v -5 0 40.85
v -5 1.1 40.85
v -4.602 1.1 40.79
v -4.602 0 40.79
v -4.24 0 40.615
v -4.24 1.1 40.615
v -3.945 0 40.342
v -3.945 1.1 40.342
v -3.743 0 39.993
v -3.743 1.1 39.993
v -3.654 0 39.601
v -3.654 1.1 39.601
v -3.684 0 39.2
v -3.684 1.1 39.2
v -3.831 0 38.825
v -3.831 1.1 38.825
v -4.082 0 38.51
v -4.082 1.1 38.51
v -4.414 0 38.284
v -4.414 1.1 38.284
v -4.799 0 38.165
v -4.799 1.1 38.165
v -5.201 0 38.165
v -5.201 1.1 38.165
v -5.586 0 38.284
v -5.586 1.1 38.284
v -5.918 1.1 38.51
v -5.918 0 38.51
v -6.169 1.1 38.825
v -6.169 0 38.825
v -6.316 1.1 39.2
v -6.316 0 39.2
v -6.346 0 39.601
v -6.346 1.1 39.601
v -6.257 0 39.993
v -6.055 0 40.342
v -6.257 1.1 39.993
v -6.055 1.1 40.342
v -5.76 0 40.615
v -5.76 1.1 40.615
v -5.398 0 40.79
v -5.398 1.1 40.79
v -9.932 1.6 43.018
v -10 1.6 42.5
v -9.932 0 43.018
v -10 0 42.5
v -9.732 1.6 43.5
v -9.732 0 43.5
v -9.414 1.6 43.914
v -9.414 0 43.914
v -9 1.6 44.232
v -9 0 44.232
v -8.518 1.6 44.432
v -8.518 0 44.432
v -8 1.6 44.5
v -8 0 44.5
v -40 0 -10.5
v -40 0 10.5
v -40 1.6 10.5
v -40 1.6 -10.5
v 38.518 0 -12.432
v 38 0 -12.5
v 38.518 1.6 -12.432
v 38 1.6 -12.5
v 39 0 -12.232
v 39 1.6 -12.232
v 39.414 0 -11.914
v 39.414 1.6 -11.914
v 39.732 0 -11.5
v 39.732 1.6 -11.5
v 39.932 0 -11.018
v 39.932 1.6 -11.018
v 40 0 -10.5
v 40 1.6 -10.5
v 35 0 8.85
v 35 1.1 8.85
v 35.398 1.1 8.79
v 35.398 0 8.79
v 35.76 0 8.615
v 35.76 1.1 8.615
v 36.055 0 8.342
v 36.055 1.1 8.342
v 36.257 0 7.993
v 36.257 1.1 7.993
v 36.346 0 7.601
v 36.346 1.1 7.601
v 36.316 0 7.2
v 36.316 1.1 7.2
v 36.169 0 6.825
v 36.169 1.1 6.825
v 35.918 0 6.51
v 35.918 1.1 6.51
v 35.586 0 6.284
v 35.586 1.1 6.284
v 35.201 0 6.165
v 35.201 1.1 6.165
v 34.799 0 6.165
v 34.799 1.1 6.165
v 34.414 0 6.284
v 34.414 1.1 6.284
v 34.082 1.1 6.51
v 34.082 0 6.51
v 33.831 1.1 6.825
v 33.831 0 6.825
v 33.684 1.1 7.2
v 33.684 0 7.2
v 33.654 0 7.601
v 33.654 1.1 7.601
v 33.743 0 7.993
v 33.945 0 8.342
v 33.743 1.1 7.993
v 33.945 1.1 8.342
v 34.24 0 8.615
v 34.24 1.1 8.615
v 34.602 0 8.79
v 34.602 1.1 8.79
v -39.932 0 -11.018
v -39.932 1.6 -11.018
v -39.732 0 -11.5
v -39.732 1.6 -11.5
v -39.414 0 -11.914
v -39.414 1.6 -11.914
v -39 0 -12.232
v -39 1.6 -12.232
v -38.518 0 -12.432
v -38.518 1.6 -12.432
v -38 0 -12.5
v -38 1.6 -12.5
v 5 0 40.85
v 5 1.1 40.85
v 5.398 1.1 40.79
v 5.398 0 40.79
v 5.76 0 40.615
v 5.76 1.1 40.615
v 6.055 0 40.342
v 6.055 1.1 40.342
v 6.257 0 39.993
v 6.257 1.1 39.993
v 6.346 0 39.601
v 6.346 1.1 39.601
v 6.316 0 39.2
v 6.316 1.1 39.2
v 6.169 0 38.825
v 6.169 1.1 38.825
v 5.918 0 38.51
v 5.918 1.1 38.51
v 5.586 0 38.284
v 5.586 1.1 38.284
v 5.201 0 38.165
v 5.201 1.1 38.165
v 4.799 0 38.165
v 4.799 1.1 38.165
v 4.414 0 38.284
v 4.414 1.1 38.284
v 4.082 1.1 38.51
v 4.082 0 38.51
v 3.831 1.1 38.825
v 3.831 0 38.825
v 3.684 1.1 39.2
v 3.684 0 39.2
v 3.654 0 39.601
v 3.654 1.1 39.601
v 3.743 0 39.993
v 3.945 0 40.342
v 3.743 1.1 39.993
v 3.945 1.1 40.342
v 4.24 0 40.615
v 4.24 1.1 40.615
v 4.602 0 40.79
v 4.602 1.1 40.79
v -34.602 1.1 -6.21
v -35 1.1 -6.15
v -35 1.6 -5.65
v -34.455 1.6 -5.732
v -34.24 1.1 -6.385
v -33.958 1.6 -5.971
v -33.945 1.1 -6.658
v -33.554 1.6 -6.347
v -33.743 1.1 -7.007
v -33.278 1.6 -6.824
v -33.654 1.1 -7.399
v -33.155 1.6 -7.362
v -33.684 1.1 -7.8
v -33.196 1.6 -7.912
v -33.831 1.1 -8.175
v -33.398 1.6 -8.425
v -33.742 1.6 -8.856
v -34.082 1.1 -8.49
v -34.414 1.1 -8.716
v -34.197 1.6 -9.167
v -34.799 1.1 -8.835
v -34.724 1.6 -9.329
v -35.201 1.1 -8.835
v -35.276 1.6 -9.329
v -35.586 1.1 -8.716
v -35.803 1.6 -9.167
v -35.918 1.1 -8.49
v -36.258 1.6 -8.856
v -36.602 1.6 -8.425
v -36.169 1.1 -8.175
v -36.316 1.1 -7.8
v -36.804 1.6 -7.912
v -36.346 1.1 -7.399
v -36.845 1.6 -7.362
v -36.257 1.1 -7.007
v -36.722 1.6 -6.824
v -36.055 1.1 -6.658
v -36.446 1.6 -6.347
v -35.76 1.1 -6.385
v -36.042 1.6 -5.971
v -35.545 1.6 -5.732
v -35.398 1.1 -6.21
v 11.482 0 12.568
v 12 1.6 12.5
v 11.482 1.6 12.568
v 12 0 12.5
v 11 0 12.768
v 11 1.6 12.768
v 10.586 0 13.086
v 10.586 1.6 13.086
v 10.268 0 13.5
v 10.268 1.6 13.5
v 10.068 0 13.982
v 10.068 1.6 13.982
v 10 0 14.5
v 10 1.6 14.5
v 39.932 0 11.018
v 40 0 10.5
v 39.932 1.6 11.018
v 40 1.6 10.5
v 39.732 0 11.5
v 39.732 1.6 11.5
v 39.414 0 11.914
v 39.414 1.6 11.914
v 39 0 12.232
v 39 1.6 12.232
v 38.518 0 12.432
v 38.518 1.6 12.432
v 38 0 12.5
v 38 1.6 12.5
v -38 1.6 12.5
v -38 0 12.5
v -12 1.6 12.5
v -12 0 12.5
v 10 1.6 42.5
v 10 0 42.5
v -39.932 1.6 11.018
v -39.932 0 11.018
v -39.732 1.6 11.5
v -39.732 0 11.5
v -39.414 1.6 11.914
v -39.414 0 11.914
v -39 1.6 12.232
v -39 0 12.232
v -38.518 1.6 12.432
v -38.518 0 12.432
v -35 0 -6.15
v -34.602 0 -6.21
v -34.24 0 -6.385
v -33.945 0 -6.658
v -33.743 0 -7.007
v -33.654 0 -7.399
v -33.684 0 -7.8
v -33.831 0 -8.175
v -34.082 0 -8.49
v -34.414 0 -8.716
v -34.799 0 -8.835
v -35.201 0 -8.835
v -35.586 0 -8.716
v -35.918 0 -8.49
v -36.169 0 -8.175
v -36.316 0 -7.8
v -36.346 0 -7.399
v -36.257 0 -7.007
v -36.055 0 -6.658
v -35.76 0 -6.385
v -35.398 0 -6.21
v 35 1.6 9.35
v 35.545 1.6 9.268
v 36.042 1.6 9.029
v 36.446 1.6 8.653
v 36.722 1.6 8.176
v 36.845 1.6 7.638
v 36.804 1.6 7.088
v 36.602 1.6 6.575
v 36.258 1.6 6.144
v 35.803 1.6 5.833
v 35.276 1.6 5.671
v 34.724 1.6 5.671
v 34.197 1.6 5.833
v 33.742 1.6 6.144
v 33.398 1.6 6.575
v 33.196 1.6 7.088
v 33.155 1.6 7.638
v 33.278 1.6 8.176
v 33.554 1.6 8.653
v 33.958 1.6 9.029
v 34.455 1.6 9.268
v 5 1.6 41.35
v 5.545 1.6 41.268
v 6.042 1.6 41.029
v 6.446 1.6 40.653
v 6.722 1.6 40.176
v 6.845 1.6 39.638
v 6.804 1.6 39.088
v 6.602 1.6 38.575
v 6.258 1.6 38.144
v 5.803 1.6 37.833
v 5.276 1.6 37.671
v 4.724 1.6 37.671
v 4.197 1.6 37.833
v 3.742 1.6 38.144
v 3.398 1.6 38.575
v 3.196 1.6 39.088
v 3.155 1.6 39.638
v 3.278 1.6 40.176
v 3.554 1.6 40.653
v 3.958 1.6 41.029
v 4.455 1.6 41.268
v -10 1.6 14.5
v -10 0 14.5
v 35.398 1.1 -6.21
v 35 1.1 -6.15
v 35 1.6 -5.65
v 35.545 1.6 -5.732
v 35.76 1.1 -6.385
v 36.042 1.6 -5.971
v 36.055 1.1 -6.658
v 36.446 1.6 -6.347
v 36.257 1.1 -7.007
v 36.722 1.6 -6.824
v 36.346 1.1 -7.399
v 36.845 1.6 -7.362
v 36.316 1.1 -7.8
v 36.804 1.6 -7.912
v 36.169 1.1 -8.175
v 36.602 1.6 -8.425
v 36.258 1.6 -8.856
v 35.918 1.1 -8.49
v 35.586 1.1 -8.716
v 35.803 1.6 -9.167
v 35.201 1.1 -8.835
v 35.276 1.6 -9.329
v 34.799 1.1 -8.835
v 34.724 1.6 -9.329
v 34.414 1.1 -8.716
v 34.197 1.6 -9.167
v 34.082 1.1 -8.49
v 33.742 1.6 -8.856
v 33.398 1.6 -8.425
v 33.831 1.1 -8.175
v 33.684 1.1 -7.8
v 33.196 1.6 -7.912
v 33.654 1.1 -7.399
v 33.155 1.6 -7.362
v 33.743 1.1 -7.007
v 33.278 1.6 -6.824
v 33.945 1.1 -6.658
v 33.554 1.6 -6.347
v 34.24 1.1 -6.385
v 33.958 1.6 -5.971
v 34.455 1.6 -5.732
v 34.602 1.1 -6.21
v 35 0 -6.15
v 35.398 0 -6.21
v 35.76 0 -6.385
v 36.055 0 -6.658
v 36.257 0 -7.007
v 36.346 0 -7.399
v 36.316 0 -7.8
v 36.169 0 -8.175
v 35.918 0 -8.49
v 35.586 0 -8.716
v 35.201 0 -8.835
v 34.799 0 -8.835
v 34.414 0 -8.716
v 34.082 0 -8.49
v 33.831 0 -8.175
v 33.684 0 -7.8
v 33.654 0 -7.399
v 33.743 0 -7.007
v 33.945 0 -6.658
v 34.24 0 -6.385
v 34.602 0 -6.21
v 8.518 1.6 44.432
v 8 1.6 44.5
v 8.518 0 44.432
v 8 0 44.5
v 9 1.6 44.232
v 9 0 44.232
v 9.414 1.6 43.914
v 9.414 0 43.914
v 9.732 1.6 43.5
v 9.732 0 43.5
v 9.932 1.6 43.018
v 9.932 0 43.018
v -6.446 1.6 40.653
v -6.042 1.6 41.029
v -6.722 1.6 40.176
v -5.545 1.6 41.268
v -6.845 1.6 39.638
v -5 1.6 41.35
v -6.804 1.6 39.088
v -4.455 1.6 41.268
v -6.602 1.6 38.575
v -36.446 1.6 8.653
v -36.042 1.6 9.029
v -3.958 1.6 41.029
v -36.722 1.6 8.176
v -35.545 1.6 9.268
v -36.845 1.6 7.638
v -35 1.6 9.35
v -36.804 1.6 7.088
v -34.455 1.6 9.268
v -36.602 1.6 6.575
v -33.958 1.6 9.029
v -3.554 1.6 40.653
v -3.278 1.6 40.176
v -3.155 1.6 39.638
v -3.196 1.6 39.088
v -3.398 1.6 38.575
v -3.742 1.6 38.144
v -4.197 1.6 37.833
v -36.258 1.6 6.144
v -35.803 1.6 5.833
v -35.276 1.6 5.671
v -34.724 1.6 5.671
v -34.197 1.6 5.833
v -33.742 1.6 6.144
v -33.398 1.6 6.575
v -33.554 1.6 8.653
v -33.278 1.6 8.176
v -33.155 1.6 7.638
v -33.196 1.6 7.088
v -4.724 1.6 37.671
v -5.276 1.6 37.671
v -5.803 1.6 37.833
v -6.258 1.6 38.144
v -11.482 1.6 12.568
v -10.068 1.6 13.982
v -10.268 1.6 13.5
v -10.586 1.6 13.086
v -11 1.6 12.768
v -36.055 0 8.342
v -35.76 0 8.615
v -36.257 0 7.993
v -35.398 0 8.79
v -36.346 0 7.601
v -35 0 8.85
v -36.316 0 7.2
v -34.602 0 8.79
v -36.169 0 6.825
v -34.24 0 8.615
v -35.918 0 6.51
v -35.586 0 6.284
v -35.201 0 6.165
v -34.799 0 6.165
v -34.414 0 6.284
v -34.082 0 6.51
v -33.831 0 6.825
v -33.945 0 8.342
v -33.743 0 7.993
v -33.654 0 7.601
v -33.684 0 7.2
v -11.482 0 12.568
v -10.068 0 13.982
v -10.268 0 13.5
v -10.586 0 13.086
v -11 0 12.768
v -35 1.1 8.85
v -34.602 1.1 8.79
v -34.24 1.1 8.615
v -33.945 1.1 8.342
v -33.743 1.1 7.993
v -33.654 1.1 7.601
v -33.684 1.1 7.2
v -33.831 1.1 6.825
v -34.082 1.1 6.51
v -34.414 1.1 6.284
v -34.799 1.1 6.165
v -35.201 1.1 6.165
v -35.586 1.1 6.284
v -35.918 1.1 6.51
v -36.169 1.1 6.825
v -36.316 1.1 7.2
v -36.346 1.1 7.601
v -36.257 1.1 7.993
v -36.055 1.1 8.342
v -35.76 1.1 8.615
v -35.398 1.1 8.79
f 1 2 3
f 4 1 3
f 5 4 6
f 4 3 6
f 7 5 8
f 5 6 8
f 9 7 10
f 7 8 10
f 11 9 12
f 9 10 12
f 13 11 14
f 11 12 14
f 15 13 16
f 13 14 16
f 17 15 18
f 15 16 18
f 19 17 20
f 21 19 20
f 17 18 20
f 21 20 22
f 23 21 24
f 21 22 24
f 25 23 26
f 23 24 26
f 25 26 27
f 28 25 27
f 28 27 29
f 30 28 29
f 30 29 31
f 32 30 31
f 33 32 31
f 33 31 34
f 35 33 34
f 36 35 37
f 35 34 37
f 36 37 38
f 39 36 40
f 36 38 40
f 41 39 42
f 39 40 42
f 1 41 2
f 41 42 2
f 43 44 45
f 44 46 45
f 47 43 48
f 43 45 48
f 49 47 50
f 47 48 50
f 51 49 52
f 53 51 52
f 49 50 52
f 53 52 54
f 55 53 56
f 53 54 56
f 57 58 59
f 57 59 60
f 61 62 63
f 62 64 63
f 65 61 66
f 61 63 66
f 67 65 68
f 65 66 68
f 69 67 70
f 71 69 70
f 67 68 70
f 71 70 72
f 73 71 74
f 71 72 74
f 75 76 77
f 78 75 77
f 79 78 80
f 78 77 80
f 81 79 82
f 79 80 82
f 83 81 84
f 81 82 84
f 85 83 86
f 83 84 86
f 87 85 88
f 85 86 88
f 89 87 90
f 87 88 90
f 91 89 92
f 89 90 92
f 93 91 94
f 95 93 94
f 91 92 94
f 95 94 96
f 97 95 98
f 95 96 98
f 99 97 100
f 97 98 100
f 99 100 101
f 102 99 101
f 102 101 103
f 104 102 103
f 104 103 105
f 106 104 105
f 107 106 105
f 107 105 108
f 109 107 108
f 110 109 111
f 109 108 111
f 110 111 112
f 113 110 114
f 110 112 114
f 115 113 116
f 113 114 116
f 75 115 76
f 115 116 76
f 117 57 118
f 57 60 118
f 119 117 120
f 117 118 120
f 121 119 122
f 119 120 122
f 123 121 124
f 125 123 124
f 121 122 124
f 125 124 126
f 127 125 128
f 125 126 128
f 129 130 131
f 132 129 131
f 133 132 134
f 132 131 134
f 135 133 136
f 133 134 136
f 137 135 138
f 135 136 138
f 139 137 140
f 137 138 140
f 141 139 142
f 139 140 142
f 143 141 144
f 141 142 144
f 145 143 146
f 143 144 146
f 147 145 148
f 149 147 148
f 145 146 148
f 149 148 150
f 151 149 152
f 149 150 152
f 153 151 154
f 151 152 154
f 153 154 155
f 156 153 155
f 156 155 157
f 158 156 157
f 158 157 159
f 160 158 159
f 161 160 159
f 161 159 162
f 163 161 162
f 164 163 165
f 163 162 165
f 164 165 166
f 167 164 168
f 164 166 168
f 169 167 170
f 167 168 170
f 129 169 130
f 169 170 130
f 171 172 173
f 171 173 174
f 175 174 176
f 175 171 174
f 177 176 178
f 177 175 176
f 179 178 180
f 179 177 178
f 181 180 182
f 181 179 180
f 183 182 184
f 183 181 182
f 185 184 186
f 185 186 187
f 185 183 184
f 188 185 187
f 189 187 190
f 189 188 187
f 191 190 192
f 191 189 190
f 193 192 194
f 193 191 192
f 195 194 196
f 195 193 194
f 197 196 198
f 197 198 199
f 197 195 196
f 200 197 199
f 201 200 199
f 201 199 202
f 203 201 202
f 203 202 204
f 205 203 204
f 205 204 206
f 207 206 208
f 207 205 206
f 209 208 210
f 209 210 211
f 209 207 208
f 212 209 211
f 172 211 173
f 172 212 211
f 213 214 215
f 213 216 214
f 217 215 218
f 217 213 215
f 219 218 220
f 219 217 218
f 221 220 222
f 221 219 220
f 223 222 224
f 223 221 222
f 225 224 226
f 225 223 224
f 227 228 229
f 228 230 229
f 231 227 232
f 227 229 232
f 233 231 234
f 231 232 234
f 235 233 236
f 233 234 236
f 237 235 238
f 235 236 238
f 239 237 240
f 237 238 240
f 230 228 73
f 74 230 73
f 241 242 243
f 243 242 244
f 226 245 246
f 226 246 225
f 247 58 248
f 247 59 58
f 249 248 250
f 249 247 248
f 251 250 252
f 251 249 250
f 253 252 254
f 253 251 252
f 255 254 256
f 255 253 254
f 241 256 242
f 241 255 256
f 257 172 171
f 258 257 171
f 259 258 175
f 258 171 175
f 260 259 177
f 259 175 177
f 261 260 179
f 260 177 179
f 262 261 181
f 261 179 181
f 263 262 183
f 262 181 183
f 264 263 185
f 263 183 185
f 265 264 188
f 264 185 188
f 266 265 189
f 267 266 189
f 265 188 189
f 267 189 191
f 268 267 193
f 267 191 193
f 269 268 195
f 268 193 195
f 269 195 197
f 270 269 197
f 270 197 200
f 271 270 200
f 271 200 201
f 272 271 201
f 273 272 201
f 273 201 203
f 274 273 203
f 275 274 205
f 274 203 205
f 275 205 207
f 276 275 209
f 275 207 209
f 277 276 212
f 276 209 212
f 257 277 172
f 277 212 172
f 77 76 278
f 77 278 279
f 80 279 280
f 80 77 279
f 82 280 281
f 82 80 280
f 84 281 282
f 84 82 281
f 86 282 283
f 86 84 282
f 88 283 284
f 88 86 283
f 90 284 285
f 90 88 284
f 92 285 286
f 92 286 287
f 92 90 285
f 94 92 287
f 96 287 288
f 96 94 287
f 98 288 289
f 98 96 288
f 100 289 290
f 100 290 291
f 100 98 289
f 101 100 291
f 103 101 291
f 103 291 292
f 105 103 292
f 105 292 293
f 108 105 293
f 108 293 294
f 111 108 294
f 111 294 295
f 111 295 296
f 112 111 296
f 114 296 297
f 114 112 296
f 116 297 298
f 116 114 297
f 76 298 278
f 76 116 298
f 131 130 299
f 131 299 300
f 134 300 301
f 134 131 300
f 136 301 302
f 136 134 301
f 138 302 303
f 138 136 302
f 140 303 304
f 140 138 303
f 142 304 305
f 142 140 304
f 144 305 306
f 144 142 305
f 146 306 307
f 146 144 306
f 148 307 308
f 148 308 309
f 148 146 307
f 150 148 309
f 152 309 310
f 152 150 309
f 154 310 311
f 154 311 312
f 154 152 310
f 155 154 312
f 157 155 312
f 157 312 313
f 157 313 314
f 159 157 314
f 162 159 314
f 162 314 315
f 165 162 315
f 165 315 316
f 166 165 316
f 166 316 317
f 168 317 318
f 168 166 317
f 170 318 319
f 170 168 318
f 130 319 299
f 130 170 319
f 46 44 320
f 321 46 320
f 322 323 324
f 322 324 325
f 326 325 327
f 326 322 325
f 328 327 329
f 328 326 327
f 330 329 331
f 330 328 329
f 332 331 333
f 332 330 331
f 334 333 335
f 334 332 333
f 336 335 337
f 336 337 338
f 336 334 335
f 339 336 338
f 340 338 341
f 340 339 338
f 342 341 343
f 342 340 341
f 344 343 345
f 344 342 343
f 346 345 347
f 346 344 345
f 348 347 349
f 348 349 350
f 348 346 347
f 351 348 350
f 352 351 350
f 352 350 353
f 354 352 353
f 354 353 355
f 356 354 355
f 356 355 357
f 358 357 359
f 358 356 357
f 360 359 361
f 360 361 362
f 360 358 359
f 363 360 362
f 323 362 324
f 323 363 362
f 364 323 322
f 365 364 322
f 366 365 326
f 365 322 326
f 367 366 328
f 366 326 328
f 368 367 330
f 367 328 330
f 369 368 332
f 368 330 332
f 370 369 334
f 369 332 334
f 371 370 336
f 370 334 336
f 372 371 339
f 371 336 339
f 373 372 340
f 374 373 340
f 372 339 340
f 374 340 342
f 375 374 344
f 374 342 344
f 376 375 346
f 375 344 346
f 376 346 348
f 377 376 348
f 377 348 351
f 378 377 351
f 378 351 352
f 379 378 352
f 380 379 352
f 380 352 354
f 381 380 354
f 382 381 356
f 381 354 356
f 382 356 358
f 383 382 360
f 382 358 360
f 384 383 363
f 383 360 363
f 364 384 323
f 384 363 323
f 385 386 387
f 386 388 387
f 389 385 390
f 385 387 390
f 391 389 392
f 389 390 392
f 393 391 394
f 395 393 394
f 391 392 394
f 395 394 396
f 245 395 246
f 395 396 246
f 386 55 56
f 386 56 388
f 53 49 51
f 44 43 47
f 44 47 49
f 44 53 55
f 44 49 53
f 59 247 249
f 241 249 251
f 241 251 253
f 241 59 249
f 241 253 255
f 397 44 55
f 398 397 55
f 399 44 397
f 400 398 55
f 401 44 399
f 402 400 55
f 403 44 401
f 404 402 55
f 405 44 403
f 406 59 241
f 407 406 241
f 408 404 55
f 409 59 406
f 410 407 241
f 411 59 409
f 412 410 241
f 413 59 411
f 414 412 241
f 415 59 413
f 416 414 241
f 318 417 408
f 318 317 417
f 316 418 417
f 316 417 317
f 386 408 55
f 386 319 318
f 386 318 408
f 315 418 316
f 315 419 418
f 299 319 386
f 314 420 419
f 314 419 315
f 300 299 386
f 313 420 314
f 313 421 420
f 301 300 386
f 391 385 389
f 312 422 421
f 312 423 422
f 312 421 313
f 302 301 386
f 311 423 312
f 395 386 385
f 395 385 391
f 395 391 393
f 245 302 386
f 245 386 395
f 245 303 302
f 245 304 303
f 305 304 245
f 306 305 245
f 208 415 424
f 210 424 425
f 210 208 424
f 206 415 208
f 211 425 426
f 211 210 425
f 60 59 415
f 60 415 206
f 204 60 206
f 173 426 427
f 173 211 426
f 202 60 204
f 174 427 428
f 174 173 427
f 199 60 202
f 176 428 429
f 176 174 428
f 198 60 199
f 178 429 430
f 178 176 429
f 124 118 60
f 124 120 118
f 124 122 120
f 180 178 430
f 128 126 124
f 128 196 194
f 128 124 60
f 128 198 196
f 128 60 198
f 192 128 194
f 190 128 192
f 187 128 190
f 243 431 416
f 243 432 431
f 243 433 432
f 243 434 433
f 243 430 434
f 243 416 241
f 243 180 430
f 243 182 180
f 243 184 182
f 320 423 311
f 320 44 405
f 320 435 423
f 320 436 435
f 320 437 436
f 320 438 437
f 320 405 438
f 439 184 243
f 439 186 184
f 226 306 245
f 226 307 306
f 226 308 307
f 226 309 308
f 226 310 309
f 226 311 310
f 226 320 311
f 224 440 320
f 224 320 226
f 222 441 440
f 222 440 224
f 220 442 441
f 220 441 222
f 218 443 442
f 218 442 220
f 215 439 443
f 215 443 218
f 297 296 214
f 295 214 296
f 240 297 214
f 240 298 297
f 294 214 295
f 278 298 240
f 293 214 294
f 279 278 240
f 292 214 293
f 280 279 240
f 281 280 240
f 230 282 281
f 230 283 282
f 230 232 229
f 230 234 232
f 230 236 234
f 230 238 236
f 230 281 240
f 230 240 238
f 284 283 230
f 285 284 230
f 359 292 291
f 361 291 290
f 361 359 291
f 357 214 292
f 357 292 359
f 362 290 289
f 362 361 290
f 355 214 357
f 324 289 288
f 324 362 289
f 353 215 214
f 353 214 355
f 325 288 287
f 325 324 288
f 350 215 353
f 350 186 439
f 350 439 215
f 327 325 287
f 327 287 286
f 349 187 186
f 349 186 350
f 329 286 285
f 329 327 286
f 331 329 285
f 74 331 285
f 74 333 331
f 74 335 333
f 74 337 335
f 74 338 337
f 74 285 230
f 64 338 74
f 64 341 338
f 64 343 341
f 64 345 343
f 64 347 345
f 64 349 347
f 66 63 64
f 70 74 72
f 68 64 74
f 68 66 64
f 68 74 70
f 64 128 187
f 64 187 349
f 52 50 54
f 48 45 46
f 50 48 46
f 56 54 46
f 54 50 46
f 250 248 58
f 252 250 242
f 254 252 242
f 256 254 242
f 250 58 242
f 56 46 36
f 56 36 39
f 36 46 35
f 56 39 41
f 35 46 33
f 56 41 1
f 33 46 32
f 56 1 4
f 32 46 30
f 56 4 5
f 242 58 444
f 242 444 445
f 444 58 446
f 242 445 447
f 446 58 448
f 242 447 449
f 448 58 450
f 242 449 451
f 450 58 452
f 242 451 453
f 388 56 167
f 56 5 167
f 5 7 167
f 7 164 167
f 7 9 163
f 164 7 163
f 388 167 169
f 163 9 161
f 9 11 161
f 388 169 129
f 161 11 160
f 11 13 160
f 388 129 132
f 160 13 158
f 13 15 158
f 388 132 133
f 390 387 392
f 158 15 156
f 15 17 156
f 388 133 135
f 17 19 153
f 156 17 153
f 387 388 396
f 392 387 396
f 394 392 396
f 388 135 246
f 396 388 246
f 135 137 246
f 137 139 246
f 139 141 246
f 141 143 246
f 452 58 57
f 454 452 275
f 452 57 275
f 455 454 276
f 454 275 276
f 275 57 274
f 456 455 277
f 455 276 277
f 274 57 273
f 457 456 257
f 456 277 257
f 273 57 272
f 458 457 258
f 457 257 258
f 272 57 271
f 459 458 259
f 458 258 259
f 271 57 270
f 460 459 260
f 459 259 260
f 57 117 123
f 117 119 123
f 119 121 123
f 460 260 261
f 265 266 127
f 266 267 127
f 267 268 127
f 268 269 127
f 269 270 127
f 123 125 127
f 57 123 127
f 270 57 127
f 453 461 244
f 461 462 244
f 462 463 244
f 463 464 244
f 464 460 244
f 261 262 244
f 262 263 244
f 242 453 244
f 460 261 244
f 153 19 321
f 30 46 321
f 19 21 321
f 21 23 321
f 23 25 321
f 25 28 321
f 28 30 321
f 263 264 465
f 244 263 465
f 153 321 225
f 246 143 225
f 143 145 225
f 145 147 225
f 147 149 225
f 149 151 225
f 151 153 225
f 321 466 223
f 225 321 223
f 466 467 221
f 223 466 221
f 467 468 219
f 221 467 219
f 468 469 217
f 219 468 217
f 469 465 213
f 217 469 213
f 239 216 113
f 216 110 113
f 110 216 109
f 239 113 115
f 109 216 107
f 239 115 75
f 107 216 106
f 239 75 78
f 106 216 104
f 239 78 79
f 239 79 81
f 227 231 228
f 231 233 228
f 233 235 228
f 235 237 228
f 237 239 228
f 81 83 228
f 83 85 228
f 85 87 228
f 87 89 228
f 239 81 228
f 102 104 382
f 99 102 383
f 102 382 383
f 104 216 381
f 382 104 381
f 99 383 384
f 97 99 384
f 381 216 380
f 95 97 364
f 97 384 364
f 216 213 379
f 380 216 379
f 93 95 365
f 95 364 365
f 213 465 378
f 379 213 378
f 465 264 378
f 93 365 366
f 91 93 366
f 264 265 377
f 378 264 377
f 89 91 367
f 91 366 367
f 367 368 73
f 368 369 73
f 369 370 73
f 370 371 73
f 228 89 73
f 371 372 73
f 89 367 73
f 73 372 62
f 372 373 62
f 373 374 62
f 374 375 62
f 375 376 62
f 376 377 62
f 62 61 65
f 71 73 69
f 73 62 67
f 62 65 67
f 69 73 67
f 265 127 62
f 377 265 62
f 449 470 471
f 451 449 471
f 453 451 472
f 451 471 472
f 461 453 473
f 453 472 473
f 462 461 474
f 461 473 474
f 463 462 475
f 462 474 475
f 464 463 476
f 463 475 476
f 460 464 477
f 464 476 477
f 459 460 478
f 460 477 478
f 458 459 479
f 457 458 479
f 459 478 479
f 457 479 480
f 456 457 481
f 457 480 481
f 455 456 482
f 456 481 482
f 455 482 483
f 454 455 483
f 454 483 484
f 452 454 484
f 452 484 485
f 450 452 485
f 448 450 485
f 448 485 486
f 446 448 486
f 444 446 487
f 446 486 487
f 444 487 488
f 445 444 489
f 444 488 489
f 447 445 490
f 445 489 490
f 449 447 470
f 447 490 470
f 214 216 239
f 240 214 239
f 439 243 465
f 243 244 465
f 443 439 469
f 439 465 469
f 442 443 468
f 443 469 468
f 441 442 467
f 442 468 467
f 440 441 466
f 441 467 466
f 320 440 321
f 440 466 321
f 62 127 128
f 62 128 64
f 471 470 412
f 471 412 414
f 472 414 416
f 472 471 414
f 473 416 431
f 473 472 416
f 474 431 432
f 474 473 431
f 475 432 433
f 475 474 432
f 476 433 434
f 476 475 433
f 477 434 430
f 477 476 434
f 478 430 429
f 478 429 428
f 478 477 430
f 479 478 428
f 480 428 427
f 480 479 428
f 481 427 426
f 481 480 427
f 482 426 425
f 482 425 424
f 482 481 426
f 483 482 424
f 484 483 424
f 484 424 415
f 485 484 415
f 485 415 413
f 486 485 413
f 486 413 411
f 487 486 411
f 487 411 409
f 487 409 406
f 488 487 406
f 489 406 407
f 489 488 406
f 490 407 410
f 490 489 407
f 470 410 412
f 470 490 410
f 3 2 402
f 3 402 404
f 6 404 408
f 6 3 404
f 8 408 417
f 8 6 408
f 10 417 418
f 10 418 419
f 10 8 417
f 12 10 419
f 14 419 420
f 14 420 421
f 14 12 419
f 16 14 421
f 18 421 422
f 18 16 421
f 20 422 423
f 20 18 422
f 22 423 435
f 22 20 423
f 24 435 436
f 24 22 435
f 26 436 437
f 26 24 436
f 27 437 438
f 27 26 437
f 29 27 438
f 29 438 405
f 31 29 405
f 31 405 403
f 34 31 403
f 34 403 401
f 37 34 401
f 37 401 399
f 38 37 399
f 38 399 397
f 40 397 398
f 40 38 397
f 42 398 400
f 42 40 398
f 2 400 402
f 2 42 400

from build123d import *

# Parameters (mm, degrees)
SKETCH1_W           = 80
SKETCH1_H           = 25
BOSS_EXTRUDE1_DEPTH = 1.6
SKETCH2_W           = 20
SKETCH2_H           = 32
BOSS_EXTRUDE2_DEPTH = 1.6
SKETCH3_R           = 1.35
CUT_EXTRUDE1_DEPTH  = 1.6
SKETCH4_R           = 1.35
CUT_EXTRUDE2_DEPTH  = 1.6
SKETCH5_R           = 1.35
CUT_EXTRUDE3_DEPTH  = 1.6
SKETCH6_R           = 1.35
CUT_EXTRUDE4_DEPTH  = 1.6
SKETCH7_R           = 1.35
CUT_EXTRUDE5_DEPTH  = 1.6
SKETCH8_R           = 1.35
CUT_EXTRUDE6_DEPTH  = 1.6
CHAMFER1_SIZE       = 0.5
FILLET1_R           = 2


with BuildPart() as part:
    # Sketch1 → Boss-Extrude1 (new body)
    with BuildSketch(Plane(origin=(0, 0, 0), x_dir=(1, 0, 0), z_dir=(0, 1, 0))):
        Rectangle(SKETCH1_W, SKETCH1_H)
    extrude(amount=BOSS_EXTRUDE1_DEPTH)

    # Sketch2 → Boss-Extrude2 (add)
    with BuildSketch(Plane(origin=(0, 1.6, 0), x_dir=(1, 0, 0), z_dir=(0, 1, 0))):
        with Locations((0, -28.5)):
            Rectangle(SKETCH2_W, SKETCH2_H)
    extrude(amount=-BOSS_EXTRUDE2_DEPTH)

    # Sketch3 → Cut-Extrude1 (cut)
    with BuildSketch(Plane(origin=(0, 1.6, 0), x_dir=(1, 0, 0), z_dir=(0, 1, 0))):
        with Locations(Location((-35, 7.5, 0), (0, 0, 270))):
            Circle(SKETCH3_R)
    extrude(amount=-CUT_EXTRUDE1_DEPTH, mode=Mode.SUBTRACT)

    # Sketch4 → Cut-Extrude2 (cut)
    with BuildSketch(Plane(origin=(0, 1.6, 0), x_dir=(1, 0, 0), z_dir=(0, 1, 0))):
        with Locations(Location((35, 7.5, 0), (0, 0, 270))):
            Circle(SKETCH4_R)
    extrude(amount=-CUT_EXTRUDE2_DEPTH, mode=Mode.SUBTRACT)

    # Sketch5 → Cut-Extrude3 (cut)
    with BuildSketch(Plane(origin=(0, 1.6, 0), x_dir=(1, 0, 0), z_dir=(0, 1, 0))):
        with Locations(Location((-35, -7.5, 0), (0, 0, 270))):
            Circle(SKETCH5_R)
    extrude(amount=-CUT_EXTRUDE3_DEPTH, mode=Mode.SUBTRACT)

    # Sketch6 → Cut-Extrude4 (cut)
    with BuildSketch(Plane(origin=(0, 1.6, 0), x_dir=(1, 0, 0), z_dir=(0, 1, 0))):
        with Locations(Location((35, -7.5, 0), (0, 0, 270))):
            Circle(SKETCH6_R)
    extrude(amount=-CUT_EXTRUDE4_DEPTH, mode=Mode.SUBTRACT)

    # Sketch7 → Cut-Extrude5 (cut)
    with BuildSketch(Plane(origin=(0, 1.6, 0), x_dir=(1, 0, 0), z_dir=(0, 1, 0))):
        with Locations(Location((-5, -39.5, 0), (0, 0, 270))):
            Circle(SKETCH7_R)
    extrude(amount=-CUT_EXTRUDE5_DEPTH, mode=Mode.SUBTRACT)

    # Sketch8 → Cut-Extrude6 (cut)
    with BuildSketch(Plane(origin=(0, 1.6, 0), x_dir=(1, 0, 0), z_dir=(0, 1, 0))):
        with Locations(Location((5, -39.5, 0), (0, 0, 270))):
            Circle(SKETCH8_R)
    extrude(amount=-CUT_EXTRUDE6_DEPTH, mode=Mode.SUBTRACT)

    # Chamfer1
    chamfer1_edges = [part.edges().sort_by_distance(p)[0] for p in [
        (-35, 1.6, -8.85),
        (35, 1.6, -8.85),
        (-35, 1.6, 6.15),
        (35, 1.6, 6.15),
        (-5, 1.6, 38.15),
        (5, 1.6, 38.15),
    ]]
    chamfer(chamfer1_edges, length=CHAMFER1_SIZE)

    # Fillet1
    fillet1_edges = [part.edges().sort_by_distance(p)[0] for p in [
        (-40, 0.8, -12.5),
        (40, 0.8, -12.5),
        (40, 0.8, 12.5),
        (10, 0.8, 12.5),
        (10, 0.8, 44.5),
        (-10, 0.8, 44.5),
        (-10, 0.8, 12.5),
        (-40, 0.8, 12.5),
    ]]
    fillet(fillet1_edges, radius=FILLET1_R)


solid = part.part
